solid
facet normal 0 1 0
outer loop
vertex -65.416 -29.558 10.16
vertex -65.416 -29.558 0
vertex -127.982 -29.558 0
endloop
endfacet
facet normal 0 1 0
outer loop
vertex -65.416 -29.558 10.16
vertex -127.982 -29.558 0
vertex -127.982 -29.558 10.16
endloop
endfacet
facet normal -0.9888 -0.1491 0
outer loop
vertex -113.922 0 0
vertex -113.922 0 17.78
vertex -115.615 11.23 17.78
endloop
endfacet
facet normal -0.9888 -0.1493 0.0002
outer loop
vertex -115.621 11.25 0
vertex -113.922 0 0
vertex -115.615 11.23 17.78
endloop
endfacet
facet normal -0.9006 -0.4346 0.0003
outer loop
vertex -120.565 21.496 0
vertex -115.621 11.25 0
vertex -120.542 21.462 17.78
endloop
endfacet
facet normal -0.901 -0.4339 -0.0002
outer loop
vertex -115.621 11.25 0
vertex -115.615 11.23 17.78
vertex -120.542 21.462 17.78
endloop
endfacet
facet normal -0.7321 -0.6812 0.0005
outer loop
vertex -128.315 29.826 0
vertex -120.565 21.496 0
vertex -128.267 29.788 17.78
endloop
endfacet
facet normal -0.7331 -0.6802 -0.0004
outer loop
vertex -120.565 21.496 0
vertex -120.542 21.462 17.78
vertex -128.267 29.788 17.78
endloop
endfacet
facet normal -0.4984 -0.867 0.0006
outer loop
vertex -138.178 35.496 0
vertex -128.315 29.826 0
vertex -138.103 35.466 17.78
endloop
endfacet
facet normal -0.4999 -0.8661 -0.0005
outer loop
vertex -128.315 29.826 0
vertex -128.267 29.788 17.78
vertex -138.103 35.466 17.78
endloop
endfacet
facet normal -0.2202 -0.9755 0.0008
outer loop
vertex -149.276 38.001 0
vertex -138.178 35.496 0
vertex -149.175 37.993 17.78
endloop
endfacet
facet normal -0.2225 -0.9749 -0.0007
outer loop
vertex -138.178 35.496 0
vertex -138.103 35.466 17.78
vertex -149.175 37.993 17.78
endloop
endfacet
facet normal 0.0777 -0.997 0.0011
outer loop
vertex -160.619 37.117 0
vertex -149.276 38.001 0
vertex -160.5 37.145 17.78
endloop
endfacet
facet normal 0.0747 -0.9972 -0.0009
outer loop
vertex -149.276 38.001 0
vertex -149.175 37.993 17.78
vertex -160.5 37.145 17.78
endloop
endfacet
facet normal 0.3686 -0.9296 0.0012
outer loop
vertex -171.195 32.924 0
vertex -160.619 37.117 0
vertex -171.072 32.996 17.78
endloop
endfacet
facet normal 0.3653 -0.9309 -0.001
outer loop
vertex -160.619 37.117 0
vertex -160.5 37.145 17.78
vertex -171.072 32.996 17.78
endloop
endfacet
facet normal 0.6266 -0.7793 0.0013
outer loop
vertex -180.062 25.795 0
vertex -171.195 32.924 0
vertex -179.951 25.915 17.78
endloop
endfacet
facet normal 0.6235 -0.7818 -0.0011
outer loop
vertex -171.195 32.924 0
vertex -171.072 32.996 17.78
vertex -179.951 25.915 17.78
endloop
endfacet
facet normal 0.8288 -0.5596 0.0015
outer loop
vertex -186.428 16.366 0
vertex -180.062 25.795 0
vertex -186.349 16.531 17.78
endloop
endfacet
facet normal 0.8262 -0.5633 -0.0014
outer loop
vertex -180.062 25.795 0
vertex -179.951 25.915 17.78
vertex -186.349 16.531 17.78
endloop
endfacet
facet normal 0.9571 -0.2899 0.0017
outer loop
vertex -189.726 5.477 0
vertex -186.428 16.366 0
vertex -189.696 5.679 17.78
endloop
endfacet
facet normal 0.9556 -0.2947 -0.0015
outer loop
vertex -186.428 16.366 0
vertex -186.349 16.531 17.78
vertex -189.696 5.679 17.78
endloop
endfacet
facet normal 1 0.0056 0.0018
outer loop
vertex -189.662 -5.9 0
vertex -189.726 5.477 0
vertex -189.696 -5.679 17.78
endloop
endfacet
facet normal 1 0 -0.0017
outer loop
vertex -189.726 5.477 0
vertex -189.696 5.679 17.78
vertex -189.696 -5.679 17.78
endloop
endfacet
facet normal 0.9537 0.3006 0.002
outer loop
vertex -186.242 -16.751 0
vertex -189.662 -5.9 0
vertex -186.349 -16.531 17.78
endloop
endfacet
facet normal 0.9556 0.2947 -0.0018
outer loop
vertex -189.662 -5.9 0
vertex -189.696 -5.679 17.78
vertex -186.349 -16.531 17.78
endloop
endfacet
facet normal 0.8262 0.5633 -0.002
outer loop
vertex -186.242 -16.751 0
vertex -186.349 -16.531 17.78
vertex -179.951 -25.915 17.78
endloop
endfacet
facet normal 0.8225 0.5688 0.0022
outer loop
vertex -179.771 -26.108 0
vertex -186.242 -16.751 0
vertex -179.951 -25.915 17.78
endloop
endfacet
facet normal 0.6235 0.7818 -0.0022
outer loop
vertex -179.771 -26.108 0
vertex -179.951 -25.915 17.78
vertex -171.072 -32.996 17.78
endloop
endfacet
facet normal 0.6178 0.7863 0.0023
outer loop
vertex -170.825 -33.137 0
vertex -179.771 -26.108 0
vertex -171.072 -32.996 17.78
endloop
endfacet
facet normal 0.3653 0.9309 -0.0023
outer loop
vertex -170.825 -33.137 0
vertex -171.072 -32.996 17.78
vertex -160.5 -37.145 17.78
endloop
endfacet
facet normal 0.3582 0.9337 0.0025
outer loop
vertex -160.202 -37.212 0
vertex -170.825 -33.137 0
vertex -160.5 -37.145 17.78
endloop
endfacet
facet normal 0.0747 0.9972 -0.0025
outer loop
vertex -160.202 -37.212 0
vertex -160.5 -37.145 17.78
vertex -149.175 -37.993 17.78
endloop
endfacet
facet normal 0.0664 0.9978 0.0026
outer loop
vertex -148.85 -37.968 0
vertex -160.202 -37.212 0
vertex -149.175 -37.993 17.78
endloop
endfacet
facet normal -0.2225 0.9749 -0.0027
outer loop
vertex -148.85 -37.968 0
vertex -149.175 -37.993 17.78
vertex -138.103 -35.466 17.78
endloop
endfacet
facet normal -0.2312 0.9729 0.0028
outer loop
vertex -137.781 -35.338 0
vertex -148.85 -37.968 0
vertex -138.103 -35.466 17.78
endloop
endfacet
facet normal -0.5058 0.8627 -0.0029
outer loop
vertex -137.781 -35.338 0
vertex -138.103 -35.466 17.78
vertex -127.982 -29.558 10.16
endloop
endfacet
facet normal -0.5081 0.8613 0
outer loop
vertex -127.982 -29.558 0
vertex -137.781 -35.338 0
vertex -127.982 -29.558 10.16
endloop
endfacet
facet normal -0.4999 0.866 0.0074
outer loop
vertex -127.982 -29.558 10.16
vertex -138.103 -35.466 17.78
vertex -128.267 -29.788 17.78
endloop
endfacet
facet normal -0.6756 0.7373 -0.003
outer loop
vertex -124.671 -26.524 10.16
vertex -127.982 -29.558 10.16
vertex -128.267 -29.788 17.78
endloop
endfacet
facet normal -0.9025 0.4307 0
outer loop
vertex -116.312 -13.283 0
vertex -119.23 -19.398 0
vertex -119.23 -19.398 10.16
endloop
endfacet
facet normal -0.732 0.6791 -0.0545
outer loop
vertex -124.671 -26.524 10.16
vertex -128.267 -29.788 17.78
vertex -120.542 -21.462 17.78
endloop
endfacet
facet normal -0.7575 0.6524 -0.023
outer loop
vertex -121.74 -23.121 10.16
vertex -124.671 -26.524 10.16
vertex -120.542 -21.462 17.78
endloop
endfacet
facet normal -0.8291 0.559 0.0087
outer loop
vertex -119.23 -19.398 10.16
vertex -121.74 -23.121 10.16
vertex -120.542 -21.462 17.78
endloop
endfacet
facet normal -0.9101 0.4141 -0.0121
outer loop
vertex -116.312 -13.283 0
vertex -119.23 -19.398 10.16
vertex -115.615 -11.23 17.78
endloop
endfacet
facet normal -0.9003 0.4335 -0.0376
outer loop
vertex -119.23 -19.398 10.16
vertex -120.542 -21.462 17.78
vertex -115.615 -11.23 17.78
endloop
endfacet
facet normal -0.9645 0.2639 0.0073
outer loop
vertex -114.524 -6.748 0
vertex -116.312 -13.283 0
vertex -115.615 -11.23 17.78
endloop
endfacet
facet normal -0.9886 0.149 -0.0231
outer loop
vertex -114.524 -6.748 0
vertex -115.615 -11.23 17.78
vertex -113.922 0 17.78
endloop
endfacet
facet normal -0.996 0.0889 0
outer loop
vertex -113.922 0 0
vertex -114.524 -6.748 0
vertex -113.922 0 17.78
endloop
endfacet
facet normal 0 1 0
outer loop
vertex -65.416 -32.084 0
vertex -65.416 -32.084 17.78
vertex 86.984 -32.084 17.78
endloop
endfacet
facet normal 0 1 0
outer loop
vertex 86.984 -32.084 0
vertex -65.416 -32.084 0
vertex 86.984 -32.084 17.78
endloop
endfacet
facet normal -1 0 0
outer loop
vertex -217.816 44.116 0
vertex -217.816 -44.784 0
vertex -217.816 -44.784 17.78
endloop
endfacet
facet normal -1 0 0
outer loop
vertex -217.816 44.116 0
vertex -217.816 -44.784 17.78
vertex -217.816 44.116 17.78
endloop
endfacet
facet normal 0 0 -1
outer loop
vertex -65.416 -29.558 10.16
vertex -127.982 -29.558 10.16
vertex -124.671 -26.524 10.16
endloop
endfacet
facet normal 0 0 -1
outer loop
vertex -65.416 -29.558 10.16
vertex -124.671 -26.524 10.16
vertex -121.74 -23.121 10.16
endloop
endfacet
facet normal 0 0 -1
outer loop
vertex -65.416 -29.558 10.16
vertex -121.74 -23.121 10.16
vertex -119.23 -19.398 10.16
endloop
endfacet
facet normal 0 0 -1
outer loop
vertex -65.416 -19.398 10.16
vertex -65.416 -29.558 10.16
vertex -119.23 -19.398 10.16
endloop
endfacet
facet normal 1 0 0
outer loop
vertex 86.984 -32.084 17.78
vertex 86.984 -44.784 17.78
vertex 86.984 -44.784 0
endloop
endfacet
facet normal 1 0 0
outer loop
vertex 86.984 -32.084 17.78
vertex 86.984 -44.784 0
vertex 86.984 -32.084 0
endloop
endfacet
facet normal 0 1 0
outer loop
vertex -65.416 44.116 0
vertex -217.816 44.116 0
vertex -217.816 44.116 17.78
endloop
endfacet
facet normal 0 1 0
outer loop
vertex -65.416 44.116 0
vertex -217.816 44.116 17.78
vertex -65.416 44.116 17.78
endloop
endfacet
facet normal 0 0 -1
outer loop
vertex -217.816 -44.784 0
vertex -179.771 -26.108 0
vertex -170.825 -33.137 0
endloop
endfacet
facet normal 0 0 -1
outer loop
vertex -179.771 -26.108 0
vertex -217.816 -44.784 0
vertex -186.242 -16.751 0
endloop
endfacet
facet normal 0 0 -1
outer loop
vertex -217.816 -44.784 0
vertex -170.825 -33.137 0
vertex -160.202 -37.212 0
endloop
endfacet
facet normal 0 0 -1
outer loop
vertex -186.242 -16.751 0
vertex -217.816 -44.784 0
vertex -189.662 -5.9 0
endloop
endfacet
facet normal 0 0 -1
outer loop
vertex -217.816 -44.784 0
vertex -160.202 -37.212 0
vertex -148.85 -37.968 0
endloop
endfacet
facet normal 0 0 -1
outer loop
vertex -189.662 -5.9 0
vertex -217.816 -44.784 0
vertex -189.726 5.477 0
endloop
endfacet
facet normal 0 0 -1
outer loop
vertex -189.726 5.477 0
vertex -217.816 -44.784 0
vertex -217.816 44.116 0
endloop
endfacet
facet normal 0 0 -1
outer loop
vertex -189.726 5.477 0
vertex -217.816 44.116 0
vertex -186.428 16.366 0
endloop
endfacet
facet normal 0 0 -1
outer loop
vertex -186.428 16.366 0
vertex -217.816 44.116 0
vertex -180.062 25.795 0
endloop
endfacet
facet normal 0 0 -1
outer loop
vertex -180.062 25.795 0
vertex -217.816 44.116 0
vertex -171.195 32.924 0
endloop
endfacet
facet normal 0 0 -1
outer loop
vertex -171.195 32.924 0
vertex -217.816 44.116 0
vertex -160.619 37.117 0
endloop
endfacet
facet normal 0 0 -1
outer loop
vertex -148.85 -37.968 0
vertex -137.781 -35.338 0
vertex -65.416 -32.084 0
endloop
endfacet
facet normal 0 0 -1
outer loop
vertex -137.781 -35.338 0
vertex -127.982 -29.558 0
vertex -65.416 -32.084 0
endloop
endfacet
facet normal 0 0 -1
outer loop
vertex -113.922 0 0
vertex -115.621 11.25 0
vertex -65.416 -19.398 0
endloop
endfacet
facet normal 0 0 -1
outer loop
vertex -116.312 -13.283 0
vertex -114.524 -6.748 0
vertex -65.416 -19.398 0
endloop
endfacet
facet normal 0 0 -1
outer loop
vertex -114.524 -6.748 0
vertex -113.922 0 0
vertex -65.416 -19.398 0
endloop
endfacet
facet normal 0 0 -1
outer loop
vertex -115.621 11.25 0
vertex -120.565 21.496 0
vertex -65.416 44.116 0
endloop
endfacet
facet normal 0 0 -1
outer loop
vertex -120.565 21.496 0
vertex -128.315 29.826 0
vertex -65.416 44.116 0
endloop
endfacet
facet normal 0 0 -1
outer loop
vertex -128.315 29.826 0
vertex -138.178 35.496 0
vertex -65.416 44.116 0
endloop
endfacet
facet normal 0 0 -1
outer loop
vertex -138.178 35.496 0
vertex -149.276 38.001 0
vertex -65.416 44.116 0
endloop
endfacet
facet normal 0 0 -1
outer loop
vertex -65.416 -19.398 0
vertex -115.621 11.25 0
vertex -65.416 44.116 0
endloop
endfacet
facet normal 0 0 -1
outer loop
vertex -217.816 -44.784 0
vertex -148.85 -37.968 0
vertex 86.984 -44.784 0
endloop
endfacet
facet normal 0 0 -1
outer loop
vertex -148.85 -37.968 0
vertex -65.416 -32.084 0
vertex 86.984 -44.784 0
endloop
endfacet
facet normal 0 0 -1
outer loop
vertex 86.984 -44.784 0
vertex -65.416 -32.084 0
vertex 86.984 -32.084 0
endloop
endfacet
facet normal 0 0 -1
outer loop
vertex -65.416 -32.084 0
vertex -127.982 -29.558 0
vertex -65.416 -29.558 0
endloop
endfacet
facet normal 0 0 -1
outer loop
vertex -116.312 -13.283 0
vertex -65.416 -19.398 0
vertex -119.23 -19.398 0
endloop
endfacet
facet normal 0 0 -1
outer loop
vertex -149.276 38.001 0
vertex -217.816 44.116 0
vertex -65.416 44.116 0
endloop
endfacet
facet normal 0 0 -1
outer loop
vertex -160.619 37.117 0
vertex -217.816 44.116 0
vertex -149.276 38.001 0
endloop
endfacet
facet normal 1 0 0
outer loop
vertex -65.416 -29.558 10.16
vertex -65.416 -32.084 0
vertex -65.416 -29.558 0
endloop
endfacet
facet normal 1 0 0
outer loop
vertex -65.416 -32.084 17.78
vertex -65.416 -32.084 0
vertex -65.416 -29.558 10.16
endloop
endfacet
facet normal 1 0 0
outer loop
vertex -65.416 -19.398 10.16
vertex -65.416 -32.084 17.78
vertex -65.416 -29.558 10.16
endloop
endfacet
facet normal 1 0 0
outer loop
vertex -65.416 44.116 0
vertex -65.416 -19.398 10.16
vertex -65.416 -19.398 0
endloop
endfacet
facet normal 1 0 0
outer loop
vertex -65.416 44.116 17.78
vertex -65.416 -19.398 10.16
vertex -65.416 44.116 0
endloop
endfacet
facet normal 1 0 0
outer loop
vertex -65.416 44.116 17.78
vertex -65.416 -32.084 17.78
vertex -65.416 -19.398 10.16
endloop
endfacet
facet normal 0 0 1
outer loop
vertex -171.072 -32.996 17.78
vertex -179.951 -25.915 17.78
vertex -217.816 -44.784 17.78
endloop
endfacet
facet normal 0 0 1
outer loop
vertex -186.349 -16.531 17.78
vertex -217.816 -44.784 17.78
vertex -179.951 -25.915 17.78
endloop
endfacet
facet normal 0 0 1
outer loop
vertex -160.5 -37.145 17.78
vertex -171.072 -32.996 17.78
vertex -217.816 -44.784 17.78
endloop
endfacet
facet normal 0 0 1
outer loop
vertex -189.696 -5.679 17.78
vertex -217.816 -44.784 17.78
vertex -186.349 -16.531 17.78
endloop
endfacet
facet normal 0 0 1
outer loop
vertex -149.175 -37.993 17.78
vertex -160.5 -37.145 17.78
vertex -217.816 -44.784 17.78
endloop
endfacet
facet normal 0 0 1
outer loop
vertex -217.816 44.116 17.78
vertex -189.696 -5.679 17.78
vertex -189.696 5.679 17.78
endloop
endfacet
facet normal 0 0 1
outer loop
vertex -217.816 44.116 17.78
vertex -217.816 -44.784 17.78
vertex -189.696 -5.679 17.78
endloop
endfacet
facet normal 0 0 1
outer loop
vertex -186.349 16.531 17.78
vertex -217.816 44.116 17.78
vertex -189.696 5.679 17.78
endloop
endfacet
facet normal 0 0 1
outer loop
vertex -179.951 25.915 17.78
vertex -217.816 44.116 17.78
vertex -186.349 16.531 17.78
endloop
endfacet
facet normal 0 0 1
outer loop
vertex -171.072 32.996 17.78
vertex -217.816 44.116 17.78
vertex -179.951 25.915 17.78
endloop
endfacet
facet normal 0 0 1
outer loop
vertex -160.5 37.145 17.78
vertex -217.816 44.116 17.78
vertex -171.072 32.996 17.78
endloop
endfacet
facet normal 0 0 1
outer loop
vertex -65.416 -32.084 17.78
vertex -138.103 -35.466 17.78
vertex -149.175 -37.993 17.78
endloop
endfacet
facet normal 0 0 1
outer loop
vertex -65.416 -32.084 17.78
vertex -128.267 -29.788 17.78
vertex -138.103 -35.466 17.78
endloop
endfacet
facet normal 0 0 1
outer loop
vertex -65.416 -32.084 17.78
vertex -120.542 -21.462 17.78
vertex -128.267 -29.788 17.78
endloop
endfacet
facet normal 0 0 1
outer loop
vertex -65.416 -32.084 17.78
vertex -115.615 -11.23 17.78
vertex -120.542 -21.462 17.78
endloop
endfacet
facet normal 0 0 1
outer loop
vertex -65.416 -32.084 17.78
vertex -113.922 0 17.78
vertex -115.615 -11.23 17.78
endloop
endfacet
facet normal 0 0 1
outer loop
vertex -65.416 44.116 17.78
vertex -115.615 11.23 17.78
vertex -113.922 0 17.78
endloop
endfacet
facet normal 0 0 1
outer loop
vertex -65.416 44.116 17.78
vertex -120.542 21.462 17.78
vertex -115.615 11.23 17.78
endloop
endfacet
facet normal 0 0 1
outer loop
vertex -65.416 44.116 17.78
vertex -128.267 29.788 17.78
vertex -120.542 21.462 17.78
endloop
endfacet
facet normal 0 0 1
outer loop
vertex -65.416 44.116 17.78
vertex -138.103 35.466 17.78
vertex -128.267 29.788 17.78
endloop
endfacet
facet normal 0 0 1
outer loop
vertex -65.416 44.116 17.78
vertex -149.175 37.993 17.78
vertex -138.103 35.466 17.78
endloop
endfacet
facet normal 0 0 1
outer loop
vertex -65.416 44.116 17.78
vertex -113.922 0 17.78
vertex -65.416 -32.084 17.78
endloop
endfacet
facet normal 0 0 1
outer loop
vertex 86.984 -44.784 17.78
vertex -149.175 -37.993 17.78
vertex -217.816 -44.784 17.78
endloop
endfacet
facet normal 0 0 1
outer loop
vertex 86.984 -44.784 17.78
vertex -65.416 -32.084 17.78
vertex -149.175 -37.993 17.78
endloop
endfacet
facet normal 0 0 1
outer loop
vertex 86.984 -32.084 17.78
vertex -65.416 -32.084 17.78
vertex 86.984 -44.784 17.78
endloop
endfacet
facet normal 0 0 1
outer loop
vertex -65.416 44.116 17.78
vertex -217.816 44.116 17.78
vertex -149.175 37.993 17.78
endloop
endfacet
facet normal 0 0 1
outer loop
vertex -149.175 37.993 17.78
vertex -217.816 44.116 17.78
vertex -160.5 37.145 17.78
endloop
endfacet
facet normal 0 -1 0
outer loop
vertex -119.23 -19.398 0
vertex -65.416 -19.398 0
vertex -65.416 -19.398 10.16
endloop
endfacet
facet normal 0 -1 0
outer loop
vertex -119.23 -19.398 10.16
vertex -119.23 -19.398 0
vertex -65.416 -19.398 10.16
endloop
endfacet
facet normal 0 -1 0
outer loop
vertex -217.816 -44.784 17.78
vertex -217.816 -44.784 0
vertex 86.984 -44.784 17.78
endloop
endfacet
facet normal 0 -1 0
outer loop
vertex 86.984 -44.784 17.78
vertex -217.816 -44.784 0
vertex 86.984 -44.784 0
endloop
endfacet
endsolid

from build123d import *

# Parameters (mm, degrees)
F0_W     = 304.8
F0_H     = 88.9
F1_DEPTH = 17.78
F2_W     = 152.4
F2_H     = 76.2
F3_DEPTH = 25.4
F4_R     = 38.1
F5_DEPTH = 25.4
F6_W     = 10.16
F6_H     = 10.16
F7_DEPTH = 128.9815305102


with BuildPart() as f1:
    # F0 (on Top) → F1 (new body)
    with BuildSketch(Plane.XY):
        with Locations((-65.4162000656, -0.3342888534)):
            Rectangle(F0_W, F0_H)
    extrude(amount=F1_DEPTH)

    # F2 (on face) → F3 (cut)
    with BuildSketch(Plane.XY.offset(17.78)):
        with Locations((10.7837999344, 6.0157111466)):
            Rectangle(F2_W, F2_H)
    extrude(amount=-F3_DEPTH, mode=Mode.SUBTRACT)

    # F4 (on face) → F5 (cut)
    with BuildSketch(Plane.XY.offset(17.78)):
        with Locations((-152.0220041275, 0)):
            Circle(F4_R)
    extrude(amount=-F5_DEPTH, mode=Mode.SUBTRACT)

    # F6 (on Right) → F7 (cut, up to face)
    with BuildSketch(Plane.YZ):
        with Locations((-24.4778353107, 5.08)):
            Rectangle(F6_W, F6_H)
    extrude(amount=-F7_DEPTH, mode=Mode.SUBTRACT)


solid = f1.part
